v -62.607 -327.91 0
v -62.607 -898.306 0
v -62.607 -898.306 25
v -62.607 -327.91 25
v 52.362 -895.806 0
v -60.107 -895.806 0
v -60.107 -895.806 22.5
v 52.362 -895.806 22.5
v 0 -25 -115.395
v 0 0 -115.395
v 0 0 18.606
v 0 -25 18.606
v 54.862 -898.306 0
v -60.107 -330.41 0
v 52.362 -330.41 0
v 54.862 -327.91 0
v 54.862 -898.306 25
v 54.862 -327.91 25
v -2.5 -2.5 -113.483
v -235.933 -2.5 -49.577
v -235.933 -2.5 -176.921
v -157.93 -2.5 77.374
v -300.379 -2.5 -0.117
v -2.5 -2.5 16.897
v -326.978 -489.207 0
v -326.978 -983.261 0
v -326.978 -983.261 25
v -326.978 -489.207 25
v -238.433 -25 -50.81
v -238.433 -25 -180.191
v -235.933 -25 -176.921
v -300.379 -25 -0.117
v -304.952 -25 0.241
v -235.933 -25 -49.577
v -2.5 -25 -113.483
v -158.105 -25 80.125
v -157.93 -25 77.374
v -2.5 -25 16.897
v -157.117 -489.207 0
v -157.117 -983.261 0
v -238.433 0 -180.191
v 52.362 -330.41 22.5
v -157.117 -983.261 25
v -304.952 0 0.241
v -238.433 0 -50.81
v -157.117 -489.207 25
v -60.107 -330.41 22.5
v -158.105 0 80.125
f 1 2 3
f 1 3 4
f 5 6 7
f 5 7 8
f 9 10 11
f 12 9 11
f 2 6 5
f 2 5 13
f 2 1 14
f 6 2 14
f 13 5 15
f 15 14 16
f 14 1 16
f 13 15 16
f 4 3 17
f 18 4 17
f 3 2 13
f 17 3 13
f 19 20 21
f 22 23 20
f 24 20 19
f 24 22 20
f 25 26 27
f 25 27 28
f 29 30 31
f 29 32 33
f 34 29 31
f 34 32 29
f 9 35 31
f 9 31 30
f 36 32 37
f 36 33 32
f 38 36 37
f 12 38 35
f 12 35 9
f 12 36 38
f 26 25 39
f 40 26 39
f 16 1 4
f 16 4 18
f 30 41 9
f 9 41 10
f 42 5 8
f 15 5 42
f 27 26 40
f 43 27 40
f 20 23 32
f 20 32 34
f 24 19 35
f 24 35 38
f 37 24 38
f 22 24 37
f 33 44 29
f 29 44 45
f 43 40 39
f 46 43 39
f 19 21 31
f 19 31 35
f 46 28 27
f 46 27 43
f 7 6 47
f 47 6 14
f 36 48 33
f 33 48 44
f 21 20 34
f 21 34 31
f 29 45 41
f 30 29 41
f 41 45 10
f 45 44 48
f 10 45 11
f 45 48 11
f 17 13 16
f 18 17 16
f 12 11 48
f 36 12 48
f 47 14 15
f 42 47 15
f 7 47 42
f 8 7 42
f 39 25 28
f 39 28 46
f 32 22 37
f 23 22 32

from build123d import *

# Parameters (mm, degrees)
F1_DEPTH = 25
F2_W     = 117.4689643085
F2_H     = 570.3954398632
F3_DEPTH = 25
F2_W_2   = 169.8603928089
F2_H_2   = 494.0543472767
F4_T     = -2.5
F5_T     = -2.5


with BuildPart() as f1:
    # F0 (on Front) → F1 (new body)
    with BuildSketch(Plane.XZ):
        Polygon((0, 18.6064355075), (-238.432765007, -50.8100539446), (-238.432765007, -180.191218853), (0, -115.3946816921), align=None)
        Polygon((-304.9520864942, 0.2412221735), (-238.432765007, -50.8100539446), (0, 18.6064355075), (-158.1051498652, 80.1252052188), align=None)
    extrude(amount=F1_DEPTH)

    # F5
    f5_openings = [f1.faces().sort_by_distance(p)[0] for p in [
        (-136.568019, -25, -45.411707),
    ]]
    offset(amount=F5_T, openings=f5_openings, kind=Kind.INTERSECTION)


with BuildPart() as f3:
    # F2 (on Top) → F3 (new body)
    with BuildSketch(Plane.XY):
        with Locations((-3.8729775697, -613.1078749895)):
            Rectangle(F2_W, F2_H)
    extrude(amount=F3_DEPTH)

    # F4
    f4_openings = [f3.faces().sort_by_distance(p)[0] for p in [
        (-3.872978, -613.107875, 0),
    ]]
    offset(amount=F4_T, openings=f4_openings)


with BuildPart() as f3b:
    # F2 (on Top) → F3, piece 2 (new body)
    with BuildSketch(Plane.XY):
        with Locations((-242.0475929976, -736.234292388)):
            Rectangle(F2_W_2, F2_H_2)
    extrude(amount=F3_DEPTH)


solid = Compound([f1.part, f3.part, f3b.part])
